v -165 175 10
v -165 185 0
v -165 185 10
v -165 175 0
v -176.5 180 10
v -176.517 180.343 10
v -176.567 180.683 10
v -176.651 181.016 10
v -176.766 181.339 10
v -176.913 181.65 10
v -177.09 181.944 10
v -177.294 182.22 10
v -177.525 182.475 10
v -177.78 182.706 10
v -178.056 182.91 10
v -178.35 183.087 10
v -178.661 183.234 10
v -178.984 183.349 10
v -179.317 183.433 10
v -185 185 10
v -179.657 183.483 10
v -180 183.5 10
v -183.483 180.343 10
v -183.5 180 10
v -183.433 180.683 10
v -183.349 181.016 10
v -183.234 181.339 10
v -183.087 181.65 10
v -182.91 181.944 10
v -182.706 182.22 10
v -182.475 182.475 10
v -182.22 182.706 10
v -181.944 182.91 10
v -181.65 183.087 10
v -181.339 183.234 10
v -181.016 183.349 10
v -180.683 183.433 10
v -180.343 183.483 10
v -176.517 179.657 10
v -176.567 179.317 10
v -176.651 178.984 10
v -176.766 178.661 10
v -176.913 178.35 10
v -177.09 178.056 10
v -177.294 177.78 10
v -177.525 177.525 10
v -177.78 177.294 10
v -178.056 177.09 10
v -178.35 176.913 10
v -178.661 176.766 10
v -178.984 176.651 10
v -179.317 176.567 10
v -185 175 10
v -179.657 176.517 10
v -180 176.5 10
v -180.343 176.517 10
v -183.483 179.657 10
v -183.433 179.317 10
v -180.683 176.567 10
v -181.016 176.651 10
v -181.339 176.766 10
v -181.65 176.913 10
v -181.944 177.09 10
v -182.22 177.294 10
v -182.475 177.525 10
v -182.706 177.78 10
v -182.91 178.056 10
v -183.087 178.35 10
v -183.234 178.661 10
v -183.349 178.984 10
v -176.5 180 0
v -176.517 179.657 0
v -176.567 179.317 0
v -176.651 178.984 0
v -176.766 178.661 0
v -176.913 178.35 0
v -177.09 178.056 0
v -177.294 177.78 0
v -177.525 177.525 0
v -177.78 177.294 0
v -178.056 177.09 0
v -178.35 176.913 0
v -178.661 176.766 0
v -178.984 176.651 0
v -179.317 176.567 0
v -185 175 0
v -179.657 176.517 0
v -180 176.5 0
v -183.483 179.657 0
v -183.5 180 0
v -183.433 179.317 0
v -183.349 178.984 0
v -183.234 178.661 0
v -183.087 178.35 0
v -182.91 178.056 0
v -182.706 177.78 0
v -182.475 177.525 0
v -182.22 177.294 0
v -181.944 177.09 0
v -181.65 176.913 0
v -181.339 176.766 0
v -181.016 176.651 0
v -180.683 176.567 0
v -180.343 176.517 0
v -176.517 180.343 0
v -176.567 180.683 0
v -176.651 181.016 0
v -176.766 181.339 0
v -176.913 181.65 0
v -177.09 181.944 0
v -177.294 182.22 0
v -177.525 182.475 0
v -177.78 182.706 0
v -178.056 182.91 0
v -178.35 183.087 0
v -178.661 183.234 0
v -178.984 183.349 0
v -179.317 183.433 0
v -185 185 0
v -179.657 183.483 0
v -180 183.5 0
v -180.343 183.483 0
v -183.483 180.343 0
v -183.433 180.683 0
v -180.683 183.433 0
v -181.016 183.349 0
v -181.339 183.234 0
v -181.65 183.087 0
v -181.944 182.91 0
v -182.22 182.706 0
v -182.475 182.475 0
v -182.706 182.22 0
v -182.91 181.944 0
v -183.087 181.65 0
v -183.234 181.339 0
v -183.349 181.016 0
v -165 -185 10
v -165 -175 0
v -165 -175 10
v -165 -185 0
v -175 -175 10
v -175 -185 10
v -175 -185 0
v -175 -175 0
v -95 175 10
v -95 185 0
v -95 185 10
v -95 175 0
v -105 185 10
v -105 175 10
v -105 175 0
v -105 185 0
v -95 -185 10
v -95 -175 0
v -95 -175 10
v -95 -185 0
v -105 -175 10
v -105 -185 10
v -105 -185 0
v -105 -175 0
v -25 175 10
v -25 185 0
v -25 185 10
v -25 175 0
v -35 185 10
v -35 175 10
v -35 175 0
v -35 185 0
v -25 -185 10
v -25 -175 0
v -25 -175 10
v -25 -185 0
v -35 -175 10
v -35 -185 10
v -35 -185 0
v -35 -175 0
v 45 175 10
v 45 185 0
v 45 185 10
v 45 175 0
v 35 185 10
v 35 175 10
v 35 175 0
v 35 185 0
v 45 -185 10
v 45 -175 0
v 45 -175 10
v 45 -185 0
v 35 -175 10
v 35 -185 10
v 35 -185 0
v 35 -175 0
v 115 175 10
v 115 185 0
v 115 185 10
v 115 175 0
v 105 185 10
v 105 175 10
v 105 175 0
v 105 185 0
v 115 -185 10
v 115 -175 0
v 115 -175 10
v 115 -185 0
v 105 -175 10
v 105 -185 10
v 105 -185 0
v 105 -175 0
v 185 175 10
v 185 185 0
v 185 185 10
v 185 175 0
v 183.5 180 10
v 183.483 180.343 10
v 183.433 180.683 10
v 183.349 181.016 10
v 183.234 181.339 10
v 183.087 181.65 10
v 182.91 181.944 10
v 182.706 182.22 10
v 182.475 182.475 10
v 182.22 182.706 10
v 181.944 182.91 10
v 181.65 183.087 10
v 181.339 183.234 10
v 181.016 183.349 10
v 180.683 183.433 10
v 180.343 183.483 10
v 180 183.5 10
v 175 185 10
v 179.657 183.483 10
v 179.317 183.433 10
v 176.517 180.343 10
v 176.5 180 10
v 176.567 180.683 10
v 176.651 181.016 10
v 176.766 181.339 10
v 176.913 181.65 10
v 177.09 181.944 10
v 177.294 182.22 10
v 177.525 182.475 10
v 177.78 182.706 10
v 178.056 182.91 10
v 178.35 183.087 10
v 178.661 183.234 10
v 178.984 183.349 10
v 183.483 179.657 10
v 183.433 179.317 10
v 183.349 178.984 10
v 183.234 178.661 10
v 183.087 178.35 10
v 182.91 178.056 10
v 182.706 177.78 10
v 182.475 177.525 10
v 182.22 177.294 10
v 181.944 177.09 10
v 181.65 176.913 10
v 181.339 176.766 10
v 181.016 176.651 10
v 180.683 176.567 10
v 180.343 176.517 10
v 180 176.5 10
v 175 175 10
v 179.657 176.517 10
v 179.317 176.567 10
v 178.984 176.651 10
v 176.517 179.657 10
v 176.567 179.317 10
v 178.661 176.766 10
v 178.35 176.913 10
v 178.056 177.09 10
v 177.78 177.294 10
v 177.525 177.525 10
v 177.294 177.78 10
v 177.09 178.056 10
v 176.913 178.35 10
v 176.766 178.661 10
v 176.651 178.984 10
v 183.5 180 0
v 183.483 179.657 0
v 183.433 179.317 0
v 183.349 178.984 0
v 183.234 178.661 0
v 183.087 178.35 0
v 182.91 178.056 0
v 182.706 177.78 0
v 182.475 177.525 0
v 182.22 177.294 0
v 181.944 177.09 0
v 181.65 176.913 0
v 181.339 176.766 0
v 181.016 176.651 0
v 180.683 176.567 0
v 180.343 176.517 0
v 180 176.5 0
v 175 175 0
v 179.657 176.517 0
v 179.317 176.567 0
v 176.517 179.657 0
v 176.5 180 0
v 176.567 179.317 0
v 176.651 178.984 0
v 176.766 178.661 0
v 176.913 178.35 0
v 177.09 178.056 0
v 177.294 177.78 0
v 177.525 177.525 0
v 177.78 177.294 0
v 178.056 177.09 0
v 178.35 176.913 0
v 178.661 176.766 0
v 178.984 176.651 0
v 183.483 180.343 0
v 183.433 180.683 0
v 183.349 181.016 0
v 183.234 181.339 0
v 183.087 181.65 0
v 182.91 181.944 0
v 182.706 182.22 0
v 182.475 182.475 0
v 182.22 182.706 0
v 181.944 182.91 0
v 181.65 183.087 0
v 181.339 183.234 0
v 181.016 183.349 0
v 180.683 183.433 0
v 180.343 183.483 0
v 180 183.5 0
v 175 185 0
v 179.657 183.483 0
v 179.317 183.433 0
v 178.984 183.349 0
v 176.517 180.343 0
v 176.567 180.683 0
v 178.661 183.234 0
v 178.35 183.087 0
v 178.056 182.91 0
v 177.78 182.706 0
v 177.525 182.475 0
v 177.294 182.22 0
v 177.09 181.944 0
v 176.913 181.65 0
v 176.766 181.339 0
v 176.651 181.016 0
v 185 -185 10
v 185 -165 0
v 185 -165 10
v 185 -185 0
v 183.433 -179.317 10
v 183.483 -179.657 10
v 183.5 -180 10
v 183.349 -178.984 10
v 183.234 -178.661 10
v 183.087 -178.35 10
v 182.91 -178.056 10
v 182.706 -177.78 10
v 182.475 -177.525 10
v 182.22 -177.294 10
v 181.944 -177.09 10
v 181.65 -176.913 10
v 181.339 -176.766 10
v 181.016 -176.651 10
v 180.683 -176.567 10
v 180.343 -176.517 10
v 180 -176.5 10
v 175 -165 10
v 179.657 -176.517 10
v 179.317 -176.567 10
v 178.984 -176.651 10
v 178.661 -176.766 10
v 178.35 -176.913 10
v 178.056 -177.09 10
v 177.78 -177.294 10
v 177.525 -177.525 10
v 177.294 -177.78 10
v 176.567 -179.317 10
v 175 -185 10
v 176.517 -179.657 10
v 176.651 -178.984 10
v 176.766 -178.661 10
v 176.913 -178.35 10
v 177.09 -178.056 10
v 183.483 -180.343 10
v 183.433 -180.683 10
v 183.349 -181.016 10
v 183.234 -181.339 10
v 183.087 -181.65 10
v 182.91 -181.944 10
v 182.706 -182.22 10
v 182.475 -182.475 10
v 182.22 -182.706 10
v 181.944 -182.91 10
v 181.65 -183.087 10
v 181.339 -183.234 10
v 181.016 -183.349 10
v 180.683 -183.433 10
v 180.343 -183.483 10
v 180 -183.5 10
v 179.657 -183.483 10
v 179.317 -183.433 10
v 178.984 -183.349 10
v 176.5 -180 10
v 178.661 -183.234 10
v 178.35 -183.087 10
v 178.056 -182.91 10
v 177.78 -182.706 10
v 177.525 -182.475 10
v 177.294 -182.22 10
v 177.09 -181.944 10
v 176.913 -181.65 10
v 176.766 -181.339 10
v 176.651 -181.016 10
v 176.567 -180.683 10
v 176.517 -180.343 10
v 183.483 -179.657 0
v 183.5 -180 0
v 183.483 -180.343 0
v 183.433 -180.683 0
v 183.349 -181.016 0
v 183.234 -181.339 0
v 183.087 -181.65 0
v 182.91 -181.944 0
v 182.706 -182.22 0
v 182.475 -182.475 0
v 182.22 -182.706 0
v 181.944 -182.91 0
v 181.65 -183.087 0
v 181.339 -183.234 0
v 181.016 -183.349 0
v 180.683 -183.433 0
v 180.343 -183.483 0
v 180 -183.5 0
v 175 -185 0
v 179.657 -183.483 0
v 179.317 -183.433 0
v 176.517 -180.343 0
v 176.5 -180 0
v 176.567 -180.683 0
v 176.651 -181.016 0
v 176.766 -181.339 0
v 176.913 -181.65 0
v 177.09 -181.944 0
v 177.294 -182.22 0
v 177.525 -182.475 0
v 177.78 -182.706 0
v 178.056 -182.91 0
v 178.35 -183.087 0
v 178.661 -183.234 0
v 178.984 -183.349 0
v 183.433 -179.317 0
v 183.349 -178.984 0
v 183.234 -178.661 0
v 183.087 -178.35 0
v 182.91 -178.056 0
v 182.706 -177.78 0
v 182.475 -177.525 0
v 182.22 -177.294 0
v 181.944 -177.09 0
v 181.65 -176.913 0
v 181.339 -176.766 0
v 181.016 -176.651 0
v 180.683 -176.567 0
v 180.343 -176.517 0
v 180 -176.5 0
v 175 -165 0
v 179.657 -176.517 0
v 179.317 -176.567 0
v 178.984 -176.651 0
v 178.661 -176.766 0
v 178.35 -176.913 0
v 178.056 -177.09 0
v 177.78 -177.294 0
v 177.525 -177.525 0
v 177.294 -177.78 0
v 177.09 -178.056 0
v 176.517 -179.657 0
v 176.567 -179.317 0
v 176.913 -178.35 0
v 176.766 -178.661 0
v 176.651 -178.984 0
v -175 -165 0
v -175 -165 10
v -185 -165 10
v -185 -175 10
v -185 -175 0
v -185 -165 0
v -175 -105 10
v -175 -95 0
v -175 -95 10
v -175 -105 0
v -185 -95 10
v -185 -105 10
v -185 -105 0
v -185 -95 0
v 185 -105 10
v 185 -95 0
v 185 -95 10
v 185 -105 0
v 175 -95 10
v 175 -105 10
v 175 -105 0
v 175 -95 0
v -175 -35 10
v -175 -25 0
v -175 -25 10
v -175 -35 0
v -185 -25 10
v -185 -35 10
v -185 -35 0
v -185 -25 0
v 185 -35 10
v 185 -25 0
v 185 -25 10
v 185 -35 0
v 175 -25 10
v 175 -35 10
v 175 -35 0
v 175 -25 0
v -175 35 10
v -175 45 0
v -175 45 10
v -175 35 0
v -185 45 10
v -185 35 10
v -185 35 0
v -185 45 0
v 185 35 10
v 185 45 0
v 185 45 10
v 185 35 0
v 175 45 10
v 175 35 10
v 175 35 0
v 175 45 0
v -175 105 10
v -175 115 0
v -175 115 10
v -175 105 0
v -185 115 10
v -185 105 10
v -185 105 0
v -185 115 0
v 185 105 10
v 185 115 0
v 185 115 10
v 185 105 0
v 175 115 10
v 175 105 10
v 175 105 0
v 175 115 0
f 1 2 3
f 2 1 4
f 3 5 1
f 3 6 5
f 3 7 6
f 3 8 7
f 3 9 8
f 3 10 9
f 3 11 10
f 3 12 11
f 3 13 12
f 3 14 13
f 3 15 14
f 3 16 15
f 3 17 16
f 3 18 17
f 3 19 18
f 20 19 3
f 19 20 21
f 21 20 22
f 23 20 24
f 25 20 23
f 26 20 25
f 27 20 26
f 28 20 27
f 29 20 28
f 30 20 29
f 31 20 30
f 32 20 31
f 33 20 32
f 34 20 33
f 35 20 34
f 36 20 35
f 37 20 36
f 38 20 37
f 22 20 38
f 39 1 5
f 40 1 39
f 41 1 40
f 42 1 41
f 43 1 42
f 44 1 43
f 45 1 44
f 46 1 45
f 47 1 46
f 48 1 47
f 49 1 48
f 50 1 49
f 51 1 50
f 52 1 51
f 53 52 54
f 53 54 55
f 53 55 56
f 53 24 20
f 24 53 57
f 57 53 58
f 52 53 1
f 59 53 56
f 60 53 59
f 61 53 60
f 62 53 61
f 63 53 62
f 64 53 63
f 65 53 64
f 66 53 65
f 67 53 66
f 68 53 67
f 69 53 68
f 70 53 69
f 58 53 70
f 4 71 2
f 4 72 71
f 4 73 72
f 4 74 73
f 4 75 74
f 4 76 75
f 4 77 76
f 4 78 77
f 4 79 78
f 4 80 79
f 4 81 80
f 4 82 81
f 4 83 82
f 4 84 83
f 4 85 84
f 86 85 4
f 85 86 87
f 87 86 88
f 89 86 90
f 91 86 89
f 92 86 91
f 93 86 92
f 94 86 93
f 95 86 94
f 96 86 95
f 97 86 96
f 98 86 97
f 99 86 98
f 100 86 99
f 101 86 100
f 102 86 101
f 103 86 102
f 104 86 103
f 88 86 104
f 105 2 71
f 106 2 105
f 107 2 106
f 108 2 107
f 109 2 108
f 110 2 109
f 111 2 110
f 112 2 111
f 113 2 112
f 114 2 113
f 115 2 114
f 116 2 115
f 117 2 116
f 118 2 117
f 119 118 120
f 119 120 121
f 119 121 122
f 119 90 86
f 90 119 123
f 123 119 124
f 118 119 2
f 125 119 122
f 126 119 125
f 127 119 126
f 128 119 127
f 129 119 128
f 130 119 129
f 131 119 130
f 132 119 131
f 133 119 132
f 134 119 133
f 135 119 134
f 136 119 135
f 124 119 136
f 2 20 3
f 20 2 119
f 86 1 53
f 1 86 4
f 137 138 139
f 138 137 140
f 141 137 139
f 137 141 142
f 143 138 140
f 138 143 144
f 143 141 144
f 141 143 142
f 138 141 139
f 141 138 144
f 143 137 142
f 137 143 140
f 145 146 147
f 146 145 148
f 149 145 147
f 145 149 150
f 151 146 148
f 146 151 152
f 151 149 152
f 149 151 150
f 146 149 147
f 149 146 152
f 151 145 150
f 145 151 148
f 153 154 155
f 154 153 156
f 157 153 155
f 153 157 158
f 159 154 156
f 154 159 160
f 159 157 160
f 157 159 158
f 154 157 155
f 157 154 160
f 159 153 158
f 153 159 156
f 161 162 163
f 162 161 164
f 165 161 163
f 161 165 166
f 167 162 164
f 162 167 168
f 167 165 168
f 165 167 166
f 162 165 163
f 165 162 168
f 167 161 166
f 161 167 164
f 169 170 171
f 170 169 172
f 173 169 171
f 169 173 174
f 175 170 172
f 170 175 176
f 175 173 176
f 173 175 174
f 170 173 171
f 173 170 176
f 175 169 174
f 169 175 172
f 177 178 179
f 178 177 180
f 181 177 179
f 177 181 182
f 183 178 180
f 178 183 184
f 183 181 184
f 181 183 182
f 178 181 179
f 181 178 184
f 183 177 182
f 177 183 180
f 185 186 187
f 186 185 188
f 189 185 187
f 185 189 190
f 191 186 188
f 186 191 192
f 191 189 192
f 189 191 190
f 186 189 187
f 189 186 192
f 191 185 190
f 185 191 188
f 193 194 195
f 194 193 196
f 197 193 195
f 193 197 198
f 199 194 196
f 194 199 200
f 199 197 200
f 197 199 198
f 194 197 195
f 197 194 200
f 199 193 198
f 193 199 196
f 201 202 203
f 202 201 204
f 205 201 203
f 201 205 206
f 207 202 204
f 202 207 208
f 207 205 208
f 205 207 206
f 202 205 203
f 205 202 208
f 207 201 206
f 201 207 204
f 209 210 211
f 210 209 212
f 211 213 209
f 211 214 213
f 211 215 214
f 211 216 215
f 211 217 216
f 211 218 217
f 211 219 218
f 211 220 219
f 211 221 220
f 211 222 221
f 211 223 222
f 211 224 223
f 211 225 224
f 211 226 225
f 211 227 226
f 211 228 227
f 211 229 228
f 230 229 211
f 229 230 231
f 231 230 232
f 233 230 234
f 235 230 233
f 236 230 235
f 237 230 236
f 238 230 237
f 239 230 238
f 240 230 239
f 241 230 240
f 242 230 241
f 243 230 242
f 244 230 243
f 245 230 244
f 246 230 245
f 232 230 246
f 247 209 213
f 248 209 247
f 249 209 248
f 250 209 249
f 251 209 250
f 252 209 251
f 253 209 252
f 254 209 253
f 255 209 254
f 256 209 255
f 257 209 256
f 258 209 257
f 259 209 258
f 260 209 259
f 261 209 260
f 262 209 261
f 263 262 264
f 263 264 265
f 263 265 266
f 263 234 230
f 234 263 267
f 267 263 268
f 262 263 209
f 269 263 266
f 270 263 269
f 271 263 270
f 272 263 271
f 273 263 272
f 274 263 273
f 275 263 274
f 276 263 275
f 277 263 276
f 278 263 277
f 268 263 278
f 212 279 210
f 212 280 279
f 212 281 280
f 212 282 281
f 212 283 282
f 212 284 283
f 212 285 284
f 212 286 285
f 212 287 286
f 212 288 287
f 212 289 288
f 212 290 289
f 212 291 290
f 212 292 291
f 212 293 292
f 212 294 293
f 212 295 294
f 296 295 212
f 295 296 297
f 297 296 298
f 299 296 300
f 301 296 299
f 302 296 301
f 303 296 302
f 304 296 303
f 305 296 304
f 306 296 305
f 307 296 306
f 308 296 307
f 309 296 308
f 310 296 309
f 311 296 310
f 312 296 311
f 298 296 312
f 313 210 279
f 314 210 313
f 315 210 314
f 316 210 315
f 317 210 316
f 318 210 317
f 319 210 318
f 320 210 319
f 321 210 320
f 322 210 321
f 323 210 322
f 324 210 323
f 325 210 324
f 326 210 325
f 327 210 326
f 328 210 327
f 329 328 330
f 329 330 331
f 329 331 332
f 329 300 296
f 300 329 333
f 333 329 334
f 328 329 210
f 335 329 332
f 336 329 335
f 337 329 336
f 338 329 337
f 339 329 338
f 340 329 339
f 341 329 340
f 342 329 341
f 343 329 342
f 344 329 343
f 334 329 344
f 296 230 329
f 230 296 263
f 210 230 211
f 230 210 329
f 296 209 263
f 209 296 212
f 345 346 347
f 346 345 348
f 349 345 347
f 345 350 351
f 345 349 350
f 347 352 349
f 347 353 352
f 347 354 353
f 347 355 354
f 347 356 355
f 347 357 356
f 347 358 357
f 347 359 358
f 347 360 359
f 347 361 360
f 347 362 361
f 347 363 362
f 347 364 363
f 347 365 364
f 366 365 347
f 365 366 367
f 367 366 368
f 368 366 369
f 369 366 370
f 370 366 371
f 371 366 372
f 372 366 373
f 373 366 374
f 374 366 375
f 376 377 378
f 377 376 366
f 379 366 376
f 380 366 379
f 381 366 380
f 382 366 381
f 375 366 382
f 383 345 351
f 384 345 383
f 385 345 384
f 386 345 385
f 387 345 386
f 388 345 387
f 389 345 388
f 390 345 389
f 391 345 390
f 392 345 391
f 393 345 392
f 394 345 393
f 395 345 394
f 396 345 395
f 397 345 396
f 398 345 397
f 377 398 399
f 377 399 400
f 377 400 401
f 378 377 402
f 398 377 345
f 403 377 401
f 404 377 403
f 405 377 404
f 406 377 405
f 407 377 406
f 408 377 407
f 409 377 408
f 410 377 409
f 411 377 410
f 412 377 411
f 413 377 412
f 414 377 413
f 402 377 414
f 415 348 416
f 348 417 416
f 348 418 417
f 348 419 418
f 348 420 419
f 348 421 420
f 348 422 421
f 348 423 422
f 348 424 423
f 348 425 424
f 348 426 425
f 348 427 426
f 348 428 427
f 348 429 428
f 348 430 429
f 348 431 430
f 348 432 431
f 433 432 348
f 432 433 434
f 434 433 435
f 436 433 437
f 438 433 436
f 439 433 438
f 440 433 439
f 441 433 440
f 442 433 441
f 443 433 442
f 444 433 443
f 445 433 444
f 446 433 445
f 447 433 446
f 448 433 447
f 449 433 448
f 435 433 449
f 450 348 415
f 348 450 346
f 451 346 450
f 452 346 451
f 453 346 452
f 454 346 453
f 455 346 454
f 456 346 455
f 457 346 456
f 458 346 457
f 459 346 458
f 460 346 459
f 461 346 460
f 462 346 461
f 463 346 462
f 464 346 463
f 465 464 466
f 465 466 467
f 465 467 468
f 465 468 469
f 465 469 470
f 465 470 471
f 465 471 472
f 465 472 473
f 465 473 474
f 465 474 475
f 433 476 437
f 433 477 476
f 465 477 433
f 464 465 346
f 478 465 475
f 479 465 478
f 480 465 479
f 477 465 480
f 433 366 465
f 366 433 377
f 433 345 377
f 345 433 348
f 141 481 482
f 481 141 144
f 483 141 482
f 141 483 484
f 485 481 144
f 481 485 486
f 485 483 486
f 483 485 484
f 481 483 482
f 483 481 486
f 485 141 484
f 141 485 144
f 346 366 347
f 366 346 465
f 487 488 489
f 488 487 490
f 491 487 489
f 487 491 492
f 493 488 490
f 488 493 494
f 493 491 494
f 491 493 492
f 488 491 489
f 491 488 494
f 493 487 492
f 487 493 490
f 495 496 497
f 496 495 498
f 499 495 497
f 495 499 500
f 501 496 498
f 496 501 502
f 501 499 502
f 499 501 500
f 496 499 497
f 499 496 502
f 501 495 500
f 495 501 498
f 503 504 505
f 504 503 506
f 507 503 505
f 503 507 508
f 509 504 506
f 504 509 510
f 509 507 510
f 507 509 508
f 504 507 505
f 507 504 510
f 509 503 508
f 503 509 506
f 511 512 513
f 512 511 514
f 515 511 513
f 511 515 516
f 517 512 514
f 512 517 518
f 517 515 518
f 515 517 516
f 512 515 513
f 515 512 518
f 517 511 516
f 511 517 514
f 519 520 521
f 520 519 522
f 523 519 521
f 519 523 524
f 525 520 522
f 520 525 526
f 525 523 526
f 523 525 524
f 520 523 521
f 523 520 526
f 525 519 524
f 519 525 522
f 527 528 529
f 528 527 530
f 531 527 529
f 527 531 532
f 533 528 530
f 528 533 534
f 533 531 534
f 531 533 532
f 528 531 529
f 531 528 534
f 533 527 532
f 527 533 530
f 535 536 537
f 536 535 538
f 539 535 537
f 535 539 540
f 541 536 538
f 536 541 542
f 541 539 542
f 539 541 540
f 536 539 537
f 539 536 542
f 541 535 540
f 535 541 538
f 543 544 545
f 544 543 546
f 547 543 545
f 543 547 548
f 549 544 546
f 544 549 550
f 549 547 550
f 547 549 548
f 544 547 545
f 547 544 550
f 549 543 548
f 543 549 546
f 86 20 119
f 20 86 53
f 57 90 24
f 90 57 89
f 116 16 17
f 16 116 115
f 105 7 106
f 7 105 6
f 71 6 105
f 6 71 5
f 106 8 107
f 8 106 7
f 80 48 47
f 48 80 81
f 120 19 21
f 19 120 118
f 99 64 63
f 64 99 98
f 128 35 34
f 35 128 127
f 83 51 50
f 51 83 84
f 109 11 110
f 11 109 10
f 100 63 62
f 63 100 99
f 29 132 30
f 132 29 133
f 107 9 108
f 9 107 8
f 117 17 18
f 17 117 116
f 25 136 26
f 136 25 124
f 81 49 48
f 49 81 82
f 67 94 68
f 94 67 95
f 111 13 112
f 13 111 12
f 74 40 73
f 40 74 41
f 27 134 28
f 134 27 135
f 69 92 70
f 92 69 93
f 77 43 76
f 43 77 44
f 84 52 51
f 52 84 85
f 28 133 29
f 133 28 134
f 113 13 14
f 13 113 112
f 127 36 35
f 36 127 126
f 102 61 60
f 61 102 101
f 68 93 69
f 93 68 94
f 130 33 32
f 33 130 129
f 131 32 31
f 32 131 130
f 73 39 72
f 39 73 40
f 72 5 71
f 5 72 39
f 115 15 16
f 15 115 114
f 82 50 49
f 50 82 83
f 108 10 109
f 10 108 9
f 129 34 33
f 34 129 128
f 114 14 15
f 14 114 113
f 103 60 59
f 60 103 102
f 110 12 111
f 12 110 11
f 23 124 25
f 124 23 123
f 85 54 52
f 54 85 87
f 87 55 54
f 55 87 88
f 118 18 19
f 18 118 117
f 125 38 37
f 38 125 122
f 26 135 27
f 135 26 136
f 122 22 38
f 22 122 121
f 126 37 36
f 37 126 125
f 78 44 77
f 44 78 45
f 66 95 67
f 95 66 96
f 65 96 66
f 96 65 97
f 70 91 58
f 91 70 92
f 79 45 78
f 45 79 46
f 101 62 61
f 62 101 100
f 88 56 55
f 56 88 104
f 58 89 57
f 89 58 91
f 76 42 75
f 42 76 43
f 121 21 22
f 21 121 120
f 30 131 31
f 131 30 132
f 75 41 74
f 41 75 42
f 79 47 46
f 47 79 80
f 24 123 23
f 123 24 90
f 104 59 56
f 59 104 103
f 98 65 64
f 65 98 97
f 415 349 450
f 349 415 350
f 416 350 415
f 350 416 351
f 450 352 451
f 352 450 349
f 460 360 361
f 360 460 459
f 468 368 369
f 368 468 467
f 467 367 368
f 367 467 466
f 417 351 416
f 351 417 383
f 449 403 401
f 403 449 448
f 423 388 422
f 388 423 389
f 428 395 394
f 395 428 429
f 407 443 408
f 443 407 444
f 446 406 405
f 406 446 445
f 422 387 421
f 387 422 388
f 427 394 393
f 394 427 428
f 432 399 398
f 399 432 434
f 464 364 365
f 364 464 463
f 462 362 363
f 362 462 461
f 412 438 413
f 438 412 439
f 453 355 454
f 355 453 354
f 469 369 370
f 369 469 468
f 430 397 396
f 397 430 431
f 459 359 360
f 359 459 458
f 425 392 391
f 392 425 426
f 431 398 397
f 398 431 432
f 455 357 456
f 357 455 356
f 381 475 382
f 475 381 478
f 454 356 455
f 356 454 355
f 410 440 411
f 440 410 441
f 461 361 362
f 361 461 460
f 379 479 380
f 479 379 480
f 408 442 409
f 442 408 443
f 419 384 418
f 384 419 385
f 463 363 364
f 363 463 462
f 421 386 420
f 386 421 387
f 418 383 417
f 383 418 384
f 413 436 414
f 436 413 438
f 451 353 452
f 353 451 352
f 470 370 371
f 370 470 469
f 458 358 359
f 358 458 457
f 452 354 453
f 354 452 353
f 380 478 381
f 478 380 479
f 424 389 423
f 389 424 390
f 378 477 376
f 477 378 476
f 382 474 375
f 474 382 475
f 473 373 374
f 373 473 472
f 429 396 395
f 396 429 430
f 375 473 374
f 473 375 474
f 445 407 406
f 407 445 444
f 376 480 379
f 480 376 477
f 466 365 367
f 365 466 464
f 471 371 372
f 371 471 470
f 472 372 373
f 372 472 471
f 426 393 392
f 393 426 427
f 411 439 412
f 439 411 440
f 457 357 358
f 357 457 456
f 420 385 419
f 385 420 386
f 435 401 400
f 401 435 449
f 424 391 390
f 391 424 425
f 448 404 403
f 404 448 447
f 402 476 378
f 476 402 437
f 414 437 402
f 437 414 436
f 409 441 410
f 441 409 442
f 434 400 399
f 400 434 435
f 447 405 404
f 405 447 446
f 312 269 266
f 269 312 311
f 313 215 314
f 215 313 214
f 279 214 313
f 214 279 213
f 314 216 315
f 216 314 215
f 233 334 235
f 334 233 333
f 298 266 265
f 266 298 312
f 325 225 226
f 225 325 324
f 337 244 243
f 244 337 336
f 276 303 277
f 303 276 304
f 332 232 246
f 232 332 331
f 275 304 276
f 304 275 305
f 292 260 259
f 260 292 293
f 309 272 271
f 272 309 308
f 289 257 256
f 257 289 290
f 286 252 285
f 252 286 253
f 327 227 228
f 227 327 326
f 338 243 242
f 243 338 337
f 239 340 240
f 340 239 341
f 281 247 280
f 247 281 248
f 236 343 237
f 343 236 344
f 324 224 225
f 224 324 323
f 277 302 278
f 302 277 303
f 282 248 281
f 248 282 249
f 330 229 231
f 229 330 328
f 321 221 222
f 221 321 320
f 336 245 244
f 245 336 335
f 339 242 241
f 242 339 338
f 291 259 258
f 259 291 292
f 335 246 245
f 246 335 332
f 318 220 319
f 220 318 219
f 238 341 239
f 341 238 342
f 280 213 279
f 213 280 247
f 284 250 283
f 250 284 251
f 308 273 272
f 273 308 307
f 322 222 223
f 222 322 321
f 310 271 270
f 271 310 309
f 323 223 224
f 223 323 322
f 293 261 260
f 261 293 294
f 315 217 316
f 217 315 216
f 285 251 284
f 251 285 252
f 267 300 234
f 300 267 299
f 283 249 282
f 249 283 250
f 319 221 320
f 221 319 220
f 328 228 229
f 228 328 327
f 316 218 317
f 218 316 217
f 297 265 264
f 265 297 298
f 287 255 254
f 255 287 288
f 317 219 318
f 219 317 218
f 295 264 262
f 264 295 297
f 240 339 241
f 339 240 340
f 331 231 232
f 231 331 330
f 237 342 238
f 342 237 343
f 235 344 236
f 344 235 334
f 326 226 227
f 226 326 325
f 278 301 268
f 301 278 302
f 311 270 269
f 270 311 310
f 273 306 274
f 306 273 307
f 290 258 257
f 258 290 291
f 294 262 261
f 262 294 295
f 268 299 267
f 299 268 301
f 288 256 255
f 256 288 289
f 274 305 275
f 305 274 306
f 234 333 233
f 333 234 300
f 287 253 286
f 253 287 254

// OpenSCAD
// ring_18.scad - ring index 18 (z bottom = 180 mm)
$fn = 64; bar = 10; half_b = bar/2; outer = 370; half_outer = outer/2;
front_y = 180; back_y = -180; left_x = -180; right_x = 180;
x_centers = [-170, -100, -30, 40, 110, 180];
z_centers = [5, 85, 155, 225, 295, 365, 435, 505, 575, 645, 715]; ring_z = 180;
module place_box(cx, cy, sx, sy) { translate([cx - sx/2, cy - sy/2, 0]) cube([sx, sy, bar]); }

difference() { union() {
    for (x = x_centers) { place_box(x, front_y, bar, bar); place_box(x, back_y, bar, bar); }
    for (y = x_centers) { place_box(left_x, y, bar, bar); place_box(right_x, y, bar, bar); }
    for (zc = z_centers) if ((zc - half_b < ring_z + bar) && (zc + half_b > ring_z)) {
        translate([-half_outer, front_y - half_b, 0]) cube([outer, bar, bar]);
        translate([-half_outer, back_y - half_b, 0])  cube([outer, bar, bar]);
        translate([left_x - half_b, -half_outer, 0])  cube([bar, outer, bar]);
        translate([right_x - half_b, -half_outer, 0]) cube([bar, outer, bar]);
    }
  }
  for (cx = [-180, 180]) for (cy = [-180, 180]) translate([cx, cy, 0]) cylinder(h = bar, r = 3.5, $fn = 64);
}
